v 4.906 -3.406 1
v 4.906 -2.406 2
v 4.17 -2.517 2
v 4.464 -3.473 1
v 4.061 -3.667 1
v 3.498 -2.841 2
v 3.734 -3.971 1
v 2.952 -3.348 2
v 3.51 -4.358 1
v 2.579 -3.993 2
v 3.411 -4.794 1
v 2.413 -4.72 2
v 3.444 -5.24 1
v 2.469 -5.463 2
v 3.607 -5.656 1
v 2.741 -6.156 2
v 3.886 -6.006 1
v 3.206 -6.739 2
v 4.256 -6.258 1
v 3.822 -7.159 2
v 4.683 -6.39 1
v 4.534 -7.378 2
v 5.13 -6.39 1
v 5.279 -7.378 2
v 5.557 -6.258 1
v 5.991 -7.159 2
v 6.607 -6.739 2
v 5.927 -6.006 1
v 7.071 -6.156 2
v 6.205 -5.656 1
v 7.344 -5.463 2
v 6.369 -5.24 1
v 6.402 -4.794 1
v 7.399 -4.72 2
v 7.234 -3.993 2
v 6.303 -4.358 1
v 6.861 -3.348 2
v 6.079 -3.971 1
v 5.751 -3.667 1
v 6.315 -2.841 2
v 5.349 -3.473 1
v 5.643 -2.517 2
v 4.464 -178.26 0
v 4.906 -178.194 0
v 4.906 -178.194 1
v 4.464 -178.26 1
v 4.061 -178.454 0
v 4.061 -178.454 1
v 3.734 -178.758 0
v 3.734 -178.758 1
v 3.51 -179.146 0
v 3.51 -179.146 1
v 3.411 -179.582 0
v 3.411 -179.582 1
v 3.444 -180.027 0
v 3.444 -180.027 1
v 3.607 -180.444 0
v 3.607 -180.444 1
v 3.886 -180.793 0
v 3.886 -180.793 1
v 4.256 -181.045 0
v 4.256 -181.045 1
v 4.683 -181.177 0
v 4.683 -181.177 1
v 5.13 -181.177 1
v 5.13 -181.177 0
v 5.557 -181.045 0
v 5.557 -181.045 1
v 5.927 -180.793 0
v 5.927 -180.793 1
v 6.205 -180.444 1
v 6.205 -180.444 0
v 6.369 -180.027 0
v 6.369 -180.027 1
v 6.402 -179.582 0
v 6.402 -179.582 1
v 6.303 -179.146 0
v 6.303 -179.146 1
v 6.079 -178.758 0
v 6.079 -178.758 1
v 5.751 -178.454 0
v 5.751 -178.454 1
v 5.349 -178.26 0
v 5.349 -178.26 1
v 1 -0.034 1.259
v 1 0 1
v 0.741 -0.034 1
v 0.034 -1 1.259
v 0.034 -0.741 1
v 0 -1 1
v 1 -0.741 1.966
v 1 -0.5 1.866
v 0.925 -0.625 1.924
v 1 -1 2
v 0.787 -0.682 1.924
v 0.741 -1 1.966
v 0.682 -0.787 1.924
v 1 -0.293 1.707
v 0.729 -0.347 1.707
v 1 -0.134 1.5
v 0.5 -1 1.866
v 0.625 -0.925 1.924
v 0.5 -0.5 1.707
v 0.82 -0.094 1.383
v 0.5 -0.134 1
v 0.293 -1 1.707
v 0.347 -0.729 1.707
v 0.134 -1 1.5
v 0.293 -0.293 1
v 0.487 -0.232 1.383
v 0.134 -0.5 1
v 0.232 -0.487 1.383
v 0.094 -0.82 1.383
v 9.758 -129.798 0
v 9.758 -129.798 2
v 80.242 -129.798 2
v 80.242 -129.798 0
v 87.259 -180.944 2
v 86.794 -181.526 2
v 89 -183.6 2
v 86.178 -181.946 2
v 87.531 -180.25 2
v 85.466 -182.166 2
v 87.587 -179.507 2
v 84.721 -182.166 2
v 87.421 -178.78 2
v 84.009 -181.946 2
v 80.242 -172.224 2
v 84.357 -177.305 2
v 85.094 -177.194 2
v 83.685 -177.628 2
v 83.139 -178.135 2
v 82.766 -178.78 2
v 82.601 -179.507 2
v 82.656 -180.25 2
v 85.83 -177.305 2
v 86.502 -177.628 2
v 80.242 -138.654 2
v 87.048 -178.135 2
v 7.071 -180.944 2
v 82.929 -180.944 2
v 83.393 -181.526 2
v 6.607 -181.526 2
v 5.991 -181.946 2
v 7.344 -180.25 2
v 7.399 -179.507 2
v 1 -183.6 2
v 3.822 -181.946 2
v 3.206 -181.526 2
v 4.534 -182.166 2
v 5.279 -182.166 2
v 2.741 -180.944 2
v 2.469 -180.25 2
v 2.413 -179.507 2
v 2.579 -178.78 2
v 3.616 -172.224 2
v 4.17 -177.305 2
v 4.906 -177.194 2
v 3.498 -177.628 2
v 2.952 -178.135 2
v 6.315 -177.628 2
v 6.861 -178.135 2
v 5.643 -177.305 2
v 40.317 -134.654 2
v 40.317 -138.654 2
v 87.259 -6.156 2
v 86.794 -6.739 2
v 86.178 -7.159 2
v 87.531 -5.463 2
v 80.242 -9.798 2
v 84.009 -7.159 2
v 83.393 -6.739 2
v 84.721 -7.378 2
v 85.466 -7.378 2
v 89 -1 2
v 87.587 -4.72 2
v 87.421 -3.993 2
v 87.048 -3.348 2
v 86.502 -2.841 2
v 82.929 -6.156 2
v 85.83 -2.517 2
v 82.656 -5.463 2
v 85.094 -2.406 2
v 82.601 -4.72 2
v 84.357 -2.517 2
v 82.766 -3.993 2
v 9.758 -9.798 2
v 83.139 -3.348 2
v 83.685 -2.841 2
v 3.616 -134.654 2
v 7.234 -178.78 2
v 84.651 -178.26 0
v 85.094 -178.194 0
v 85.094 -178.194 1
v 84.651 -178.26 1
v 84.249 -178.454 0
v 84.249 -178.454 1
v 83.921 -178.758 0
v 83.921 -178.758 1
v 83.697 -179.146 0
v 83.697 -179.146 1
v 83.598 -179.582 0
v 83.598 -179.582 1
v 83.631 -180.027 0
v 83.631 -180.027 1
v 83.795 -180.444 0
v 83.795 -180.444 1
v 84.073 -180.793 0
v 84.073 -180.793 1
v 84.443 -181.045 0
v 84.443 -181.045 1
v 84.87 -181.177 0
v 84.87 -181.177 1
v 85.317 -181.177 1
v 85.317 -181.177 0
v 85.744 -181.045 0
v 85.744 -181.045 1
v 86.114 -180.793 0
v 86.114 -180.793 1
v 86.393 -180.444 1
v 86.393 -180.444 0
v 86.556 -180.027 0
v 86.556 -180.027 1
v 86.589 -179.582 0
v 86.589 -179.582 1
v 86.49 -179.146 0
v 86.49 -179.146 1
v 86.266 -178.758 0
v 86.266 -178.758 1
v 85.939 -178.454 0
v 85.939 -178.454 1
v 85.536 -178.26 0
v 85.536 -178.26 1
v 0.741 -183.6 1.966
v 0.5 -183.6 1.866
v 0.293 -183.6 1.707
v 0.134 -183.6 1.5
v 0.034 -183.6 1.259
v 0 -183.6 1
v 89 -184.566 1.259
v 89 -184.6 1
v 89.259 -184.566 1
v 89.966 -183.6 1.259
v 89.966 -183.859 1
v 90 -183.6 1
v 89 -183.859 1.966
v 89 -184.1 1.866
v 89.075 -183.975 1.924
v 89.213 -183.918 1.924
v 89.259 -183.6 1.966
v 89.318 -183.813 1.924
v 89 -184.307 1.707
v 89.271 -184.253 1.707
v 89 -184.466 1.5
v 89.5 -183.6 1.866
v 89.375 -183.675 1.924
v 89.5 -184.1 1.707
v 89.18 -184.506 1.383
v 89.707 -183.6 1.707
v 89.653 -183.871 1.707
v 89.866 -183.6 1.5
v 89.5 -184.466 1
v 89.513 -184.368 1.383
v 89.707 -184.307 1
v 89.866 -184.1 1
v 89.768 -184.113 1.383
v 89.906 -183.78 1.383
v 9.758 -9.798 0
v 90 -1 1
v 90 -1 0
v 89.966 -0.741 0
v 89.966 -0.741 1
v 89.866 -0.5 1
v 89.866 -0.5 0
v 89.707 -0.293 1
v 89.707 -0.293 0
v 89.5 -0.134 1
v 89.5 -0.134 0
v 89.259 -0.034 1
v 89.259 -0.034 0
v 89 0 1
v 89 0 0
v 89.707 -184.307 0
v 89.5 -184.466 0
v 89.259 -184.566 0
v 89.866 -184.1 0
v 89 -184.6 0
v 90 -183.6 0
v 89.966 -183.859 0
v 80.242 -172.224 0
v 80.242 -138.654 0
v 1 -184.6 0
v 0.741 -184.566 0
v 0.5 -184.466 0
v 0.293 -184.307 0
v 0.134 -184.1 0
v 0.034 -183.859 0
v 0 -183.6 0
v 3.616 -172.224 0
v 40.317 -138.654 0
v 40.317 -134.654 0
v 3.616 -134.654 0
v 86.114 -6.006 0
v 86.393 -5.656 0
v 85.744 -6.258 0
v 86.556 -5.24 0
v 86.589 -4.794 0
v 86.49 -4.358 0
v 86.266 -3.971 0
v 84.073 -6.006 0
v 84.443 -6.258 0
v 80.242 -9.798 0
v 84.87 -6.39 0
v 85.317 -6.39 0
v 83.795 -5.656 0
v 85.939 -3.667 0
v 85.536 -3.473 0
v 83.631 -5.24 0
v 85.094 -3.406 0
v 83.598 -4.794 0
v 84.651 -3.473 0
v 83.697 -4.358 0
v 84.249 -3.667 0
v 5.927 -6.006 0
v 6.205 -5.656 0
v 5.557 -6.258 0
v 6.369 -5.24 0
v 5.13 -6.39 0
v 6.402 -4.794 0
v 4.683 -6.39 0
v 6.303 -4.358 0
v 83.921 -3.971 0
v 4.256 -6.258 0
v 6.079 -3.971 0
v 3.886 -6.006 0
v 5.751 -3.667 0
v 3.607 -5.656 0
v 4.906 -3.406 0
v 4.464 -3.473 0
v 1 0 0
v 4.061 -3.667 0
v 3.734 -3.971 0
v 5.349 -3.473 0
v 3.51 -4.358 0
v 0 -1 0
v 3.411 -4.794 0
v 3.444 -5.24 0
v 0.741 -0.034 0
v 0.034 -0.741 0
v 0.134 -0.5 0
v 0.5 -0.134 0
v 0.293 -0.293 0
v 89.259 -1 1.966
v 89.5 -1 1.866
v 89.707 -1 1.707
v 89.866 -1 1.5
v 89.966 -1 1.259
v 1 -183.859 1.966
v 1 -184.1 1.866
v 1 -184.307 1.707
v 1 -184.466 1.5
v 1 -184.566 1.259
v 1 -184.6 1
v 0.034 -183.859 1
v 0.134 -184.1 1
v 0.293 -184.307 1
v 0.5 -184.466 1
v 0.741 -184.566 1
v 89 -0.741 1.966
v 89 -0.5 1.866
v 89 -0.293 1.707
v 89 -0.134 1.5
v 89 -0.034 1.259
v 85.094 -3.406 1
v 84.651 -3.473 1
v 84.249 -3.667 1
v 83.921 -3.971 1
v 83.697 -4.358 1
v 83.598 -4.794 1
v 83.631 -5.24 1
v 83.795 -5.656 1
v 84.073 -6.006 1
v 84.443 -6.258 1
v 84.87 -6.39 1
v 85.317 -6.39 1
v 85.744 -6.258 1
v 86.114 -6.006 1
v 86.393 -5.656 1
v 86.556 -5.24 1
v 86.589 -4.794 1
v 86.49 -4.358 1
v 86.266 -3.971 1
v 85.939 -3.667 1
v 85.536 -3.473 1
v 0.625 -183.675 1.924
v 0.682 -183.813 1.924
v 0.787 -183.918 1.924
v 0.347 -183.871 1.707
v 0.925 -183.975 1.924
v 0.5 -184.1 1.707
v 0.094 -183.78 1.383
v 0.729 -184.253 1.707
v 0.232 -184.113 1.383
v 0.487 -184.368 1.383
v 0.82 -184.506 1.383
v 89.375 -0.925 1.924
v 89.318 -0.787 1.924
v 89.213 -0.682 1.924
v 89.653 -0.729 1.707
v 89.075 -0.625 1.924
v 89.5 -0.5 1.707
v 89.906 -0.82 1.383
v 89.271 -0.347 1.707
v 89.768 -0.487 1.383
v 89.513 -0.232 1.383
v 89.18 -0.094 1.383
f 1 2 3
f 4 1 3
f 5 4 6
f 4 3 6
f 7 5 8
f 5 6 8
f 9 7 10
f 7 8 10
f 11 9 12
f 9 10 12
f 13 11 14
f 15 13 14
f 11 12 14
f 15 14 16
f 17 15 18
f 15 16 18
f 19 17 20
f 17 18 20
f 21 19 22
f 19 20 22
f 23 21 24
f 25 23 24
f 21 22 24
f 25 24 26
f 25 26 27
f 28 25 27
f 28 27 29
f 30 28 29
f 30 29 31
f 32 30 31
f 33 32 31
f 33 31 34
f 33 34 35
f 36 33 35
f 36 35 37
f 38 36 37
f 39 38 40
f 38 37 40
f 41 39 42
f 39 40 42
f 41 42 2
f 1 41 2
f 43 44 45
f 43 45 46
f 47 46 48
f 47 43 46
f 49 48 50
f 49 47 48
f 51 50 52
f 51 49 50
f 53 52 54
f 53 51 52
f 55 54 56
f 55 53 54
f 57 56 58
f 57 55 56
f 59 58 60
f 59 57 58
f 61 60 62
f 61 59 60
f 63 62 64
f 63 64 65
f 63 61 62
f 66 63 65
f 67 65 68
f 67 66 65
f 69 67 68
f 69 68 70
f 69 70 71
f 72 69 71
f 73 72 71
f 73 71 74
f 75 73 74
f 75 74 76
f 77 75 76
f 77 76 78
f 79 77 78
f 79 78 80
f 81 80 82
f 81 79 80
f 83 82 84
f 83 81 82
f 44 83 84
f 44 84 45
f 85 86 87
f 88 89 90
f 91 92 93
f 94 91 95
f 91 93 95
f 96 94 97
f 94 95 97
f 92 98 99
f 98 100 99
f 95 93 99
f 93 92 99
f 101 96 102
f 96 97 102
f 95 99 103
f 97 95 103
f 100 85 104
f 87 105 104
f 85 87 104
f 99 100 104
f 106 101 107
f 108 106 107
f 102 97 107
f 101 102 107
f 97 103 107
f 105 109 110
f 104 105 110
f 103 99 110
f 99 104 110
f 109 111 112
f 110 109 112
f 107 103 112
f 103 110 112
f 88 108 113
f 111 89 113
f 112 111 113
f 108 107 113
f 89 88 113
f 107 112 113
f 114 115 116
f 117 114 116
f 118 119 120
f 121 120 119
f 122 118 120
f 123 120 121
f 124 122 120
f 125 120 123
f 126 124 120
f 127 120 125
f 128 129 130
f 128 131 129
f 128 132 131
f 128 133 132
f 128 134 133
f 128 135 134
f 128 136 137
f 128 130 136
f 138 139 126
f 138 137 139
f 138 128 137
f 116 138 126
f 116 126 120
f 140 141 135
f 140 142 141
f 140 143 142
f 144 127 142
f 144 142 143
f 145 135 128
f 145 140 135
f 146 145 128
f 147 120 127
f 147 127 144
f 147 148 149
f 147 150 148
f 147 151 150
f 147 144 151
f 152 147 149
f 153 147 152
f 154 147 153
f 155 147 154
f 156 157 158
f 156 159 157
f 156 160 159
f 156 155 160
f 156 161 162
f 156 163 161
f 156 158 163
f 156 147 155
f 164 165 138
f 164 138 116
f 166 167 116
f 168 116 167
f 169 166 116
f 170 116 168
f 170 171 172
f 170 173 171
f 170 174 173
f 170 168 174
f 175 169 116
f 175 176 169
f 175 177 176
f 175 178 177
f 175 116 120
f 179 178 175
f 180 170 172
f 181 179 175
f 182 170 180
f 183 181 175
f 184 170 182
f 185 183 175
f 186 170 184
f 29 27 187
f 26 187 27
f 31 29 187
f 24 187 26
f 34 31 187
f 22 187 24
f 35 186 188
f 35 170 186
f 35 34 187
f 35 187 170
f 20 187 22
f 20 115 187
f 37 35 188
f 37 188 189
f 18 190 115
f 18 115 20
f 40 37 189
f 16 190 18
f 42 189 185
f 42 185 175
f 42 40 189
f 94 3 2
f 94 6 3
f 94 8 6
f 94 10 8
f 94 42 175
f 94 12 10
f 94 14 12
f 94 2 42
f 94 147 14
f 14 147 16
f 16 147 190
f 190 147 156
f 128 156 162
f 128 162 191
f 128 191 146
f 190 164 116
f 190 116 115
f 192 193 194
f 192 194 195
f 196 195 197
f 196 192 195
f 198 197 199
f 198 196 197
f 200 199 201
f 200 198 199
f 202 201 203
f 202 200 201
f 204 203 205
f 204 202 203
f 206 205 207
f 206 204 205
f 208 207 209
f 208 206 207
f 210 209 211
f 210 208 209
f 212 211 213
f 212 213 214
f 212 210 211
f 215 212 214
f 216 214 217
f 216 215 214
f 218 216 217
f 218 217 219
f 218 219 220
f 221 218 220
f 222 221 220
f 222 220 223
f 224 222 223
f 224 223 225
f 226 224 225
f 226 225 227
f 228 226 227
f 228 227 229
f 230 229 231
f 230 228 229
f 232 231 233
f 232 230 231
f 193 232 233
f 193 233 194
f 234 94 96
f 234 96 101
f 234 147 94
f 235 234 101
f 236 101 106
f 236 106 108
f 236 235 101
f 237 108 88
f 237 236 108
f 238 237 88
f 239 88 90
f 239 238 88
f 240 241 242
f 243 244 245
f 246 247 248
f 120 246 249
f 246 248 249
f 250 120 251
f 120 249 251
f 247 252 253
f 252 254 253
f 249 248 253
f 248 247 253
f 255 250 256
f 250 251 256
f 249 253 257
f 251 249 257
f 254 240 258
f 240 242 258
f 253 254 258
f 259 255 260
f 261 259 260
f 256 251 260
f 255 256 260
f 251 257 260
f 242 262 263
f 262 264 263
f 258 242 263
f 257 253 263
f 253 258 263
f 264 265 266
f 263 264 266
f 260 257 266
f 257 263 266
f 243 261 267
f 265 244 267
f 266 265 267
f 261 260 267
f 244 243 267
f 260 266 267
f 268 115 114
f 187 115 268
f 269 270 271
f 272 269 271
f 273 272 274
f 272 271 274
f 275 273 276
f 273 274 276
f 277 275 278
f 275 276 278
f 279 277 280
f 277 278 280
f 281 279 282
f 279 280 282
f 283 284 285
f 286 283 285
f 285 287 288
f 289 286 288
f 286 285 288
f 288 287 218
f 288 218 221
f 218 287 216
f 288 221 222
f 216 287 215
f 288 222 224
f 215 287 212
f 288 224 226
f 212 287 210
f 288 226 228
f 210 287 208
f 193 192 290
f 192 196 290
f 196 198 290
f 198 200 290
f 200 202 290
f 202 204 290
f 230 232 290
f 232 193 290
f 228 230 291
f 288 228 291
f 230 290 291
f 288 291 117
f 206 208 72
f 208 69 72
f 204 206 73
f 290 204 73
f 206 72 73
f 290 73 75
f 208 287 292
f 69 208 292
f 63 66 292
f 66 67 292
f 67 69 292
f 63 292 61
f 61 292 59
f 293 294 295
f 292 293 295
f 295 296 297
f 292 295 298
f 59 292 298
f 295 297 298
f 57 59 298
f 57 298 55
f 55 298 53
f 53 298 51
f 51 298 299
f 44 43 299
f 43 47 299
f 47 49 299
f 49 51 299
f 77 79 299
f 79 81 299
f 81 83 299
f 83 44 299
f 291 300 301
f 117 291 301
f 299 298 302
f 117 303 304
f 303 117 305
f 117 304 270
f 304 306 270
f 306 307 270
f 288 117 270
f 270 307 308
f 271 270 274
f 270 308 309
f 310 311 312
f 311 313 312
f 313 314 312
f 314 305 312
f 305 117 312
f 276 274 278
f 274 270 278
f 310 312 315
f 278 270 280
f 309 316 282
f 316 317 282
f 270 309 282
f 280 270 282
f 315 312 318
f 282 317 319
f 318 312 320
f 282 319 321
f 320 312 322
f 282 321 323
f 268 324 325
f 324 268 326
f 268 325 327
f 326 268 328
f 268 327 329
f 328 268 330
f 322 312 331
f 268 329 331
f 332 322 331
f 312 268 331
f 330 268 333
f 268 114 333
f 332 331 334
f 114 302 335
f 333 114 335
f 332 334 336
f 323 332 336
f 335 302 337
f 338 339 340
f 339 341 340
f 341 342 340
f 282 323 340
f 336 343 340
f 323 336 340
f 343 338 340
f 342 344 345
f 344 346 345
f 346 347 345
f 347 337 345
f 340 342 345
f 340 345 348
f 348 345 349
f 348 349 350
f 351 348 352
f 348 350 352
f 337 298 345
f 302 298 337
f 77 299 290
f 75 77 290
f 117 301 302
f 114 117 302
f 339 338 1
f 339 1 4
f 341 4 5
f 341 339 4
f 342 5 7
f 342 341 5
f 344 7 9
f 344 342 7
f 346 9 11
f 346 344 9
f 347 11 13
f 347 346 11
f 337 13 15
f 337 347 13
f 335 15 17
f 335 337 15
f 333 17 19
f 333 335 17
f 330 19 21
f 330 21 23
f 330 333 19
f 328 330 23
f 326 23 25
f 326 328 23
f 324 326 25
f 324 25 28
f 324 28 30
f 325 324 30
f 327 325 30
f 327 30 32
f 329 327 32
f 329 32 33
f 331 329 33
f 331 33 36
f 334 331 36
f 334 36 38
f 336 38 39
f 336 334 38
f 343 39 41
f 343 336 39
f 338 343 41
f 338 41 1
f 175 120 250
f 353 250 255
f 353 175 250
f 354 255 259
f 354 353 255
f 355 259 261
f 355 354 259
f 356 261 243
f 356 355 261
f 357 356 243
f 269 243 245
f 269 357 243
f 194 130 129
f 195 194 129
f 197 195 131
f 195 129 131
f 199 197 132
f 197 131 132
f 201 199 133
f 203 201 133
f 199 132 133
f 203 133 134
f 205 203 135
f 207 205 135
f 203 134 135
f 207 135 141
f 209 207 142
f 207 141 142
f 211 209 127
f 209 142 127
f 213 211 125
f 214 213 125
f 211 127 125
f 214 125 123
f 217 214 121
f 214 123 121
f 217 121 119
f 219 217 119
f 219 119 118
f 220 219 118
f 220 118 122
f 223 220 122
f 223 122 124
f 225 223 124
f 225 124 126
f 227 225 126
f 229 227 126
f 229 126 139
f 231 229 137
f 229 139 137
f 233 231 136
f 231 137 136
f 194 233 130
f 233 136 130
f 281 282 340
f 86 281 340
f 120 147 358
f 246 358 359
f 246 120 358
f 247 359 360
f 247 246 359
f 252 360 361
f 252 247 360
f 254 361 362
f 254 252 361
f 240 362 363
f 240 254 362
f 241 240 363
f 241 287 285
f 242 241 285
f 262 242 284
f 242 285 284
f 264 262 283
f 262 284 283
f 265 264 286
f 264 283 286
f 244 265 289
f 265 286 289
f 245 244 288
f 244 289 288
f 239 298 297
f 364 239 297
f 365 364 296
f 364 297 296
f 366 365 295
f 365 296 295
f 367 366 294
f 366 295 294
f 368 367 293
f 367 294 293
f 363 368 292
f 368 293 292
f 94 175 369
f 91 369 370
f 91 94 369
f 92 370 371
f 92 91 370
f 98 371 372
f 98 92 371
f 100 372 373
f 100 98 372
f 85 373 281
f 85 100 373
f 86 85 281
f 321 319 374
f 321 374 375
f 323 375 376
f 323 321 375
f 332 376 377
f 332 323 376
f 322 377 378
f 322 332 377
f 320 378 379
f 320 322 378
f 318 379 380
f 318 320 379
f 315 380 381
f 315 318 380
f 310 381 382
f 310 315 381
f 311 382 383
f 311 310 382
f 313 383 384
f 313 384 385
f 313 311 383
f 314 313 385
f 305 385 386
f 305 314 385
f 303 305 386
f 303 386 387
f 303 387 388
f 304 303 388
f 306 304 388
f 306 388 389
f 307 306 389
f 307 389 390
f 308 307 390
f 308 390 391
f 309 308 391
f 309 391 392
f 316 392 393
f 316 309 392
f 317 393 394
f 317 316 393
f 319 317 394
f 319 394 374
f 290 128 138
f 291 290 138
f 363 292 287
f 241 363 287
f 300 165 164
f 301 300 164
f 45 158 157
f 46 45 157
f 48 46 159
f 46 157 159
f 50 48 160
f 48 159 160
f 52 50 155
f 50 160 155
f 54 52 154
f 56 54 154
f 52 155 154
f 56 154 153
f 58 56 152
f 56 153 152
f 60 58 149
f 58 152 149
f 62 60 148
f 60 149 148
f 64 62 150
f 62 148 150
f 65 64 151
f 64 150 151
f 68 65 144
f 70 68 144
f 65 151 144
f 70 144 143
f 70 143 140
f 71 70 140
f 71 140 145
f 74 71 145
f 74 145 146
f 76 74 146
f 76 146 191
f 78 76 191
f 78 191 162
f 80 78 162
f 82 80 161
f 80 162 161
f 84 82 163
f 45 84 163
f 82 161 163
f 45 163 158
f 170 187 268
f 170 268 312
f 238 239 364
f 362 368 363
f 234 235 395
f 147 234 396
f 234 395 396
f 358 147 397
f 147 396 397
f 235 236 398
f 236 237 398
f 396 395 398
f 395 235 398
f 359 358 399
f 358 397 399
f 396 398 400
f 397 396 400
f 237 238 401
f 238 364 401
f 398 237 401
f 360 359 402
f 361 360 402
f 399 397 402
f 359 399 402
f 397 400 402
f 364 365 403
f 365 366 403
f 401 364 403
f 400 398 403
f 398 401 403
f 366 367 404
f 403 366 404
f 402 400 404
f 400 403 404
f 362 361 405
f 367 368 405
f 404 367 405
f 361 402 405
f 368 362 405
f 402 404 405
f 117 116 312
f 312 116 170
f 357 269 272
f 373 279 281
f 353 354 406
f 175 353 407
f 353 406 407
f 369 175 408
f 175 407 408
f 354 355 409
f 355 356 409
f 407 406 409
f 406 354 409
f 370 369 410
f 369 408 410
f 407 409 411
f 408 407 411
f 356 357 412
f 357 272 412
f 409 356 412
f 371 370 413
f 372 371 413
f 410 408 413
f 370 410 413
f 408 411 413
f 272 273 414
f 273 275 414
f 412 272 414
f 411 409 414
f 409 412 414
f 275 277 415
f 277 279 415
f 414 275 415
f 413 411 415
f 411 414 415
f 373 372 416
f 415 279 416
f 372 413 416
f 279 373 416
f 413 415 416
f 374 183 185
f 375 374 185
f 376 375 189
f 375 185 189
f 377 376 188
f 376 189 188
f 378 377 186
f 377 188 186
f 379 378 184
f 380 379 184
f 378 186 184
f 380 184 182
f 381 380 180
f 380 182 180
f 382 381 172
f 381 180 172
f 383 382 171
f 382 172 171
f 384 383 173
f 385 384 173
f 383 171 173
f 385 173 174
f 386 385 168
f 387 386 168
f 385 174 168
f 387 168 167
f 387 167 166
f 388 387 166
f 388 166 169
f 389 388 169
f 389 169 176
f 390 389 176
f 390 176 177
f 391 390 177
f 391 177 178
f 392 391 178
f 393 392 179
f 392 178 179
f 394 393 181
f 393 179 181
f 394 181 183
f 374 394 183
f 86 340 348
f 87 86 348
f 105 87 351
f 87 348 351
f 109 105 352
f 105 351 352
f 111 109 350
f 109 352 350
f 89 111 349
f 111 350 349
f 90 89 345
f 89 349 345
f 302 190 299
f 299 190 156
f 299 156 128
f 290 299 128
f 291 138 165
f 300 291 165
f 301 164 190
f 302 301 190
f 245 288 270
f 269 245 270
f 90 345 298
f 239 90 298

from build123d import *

# Parameters (mm, degrees)
IZIM1_R                              = 1.5
N_PANEL_DEPTH                        = 2
VIDA_DELIKLERI_45DERECE_PAH_1MM_SIZE = 1
IZIM2_W                              = 70.48450085
IZIM2_H                              = 120
EKRAN_VE_KONTROLC_DELIKLERI_DEPTH    = 2
FILLET1_R                            = 1


with BuildPart() as part:
    # Çizim1 → Ön Panel (new body)
    with BuildSketch(Plane(origin=(0, 0, 0), x_dir=(0, 1, 0), z_dir=(0, 0, 1))):
        with BuildLine():
            Line((-1, 0), (-183.6, 0))
            ThreePointArc((-183.6, 0), (-184.307106781, -0.292893219), (-184.6, -1))
            Line((-184.6, -1), (-184.6, -89))
            ThreePointArc((-184.6, -89), (-184.307106781, -89.707106781), (-183.6, -90))
            Line((-183.6, -90), (-1, -90))
            ThreePointArc((-1, -90), (-0.292893219, -89.707106781), (0, -89))
            Line((0, -89), (0, -1))
            ThreePointArc((0, -1), (-0.292893219, -0.292893219), (-1, 0))
        make_face()
        with Locations((-179.693599404, -4.906400596)):
            Circle(IZIM1_R, mode=Mode.SUBTRACT)
        with Locations((-4.906400596, -4.906400596)):
            Circle(IZIM1_R, mode=Mode.SUBTRACT)
        with Locations((-179.693599404, -85.093599404)):
            Circle(IZIM1_R, mode=Mode.SUBTRACT)
        with Locations((-4.906400596, -85.093599404)):
            Circle(IZIM1_R, mode=Mode.SUBTRACT)
    extrude(amount=N_PANEL_DEPTH)

    # Vida Delikleri 45derece Pah 1mm
    vida_delikleri_45derece_pah_1mm_edges = [part.edges().sort_by_distance(p)[0] for p in [
        (85.093599404, -6.406400596, 2),
        (4.906400596, -6.406400596, 2),
        (4.906400596, -181.193599404, 2),
        (85.093599404, -181.193599404, 2),
    ]]
    chamfer(vida_delikleri_45derece_pah_1mm_edges, length=VIDA_DELIKLERI_45DERECE_PAH_1MM_SIZE)

    # Çizim2 → Ekran ve Kontrolcü delikleri (cut)
    with BuildSketch(Plane.XY.offset(2)):
        with Locations((45, -69.798366298)):
            Rectangle(IZIM2_W, IZIM2_H)
        Polygon((40.317046277, -138.653704662), (40.317046277, -134.653704662), (3.616207615, -134.653704662), (3.616207615, -172.224363873), (80.242250425, -172.224363873), (80.242250425, -138.653704662), align=None)
    extrude(amount=-EKRAN_VE_KONTROLC_DELIKLERI_DEPTH, mode=Mode.SUBTRACT)

    # Fillet1
    fillet1_edges = [part.edges().sort_by_distance(p)[0] for p in [
        (0, -92.3, 2),
        (45, -184.6, 2),
        (90, -92.3, 2),
        (45, 0, 2),
    ]]
    fillet(fillet1_edges, radius=FILLET1_R)


solid = part.part
